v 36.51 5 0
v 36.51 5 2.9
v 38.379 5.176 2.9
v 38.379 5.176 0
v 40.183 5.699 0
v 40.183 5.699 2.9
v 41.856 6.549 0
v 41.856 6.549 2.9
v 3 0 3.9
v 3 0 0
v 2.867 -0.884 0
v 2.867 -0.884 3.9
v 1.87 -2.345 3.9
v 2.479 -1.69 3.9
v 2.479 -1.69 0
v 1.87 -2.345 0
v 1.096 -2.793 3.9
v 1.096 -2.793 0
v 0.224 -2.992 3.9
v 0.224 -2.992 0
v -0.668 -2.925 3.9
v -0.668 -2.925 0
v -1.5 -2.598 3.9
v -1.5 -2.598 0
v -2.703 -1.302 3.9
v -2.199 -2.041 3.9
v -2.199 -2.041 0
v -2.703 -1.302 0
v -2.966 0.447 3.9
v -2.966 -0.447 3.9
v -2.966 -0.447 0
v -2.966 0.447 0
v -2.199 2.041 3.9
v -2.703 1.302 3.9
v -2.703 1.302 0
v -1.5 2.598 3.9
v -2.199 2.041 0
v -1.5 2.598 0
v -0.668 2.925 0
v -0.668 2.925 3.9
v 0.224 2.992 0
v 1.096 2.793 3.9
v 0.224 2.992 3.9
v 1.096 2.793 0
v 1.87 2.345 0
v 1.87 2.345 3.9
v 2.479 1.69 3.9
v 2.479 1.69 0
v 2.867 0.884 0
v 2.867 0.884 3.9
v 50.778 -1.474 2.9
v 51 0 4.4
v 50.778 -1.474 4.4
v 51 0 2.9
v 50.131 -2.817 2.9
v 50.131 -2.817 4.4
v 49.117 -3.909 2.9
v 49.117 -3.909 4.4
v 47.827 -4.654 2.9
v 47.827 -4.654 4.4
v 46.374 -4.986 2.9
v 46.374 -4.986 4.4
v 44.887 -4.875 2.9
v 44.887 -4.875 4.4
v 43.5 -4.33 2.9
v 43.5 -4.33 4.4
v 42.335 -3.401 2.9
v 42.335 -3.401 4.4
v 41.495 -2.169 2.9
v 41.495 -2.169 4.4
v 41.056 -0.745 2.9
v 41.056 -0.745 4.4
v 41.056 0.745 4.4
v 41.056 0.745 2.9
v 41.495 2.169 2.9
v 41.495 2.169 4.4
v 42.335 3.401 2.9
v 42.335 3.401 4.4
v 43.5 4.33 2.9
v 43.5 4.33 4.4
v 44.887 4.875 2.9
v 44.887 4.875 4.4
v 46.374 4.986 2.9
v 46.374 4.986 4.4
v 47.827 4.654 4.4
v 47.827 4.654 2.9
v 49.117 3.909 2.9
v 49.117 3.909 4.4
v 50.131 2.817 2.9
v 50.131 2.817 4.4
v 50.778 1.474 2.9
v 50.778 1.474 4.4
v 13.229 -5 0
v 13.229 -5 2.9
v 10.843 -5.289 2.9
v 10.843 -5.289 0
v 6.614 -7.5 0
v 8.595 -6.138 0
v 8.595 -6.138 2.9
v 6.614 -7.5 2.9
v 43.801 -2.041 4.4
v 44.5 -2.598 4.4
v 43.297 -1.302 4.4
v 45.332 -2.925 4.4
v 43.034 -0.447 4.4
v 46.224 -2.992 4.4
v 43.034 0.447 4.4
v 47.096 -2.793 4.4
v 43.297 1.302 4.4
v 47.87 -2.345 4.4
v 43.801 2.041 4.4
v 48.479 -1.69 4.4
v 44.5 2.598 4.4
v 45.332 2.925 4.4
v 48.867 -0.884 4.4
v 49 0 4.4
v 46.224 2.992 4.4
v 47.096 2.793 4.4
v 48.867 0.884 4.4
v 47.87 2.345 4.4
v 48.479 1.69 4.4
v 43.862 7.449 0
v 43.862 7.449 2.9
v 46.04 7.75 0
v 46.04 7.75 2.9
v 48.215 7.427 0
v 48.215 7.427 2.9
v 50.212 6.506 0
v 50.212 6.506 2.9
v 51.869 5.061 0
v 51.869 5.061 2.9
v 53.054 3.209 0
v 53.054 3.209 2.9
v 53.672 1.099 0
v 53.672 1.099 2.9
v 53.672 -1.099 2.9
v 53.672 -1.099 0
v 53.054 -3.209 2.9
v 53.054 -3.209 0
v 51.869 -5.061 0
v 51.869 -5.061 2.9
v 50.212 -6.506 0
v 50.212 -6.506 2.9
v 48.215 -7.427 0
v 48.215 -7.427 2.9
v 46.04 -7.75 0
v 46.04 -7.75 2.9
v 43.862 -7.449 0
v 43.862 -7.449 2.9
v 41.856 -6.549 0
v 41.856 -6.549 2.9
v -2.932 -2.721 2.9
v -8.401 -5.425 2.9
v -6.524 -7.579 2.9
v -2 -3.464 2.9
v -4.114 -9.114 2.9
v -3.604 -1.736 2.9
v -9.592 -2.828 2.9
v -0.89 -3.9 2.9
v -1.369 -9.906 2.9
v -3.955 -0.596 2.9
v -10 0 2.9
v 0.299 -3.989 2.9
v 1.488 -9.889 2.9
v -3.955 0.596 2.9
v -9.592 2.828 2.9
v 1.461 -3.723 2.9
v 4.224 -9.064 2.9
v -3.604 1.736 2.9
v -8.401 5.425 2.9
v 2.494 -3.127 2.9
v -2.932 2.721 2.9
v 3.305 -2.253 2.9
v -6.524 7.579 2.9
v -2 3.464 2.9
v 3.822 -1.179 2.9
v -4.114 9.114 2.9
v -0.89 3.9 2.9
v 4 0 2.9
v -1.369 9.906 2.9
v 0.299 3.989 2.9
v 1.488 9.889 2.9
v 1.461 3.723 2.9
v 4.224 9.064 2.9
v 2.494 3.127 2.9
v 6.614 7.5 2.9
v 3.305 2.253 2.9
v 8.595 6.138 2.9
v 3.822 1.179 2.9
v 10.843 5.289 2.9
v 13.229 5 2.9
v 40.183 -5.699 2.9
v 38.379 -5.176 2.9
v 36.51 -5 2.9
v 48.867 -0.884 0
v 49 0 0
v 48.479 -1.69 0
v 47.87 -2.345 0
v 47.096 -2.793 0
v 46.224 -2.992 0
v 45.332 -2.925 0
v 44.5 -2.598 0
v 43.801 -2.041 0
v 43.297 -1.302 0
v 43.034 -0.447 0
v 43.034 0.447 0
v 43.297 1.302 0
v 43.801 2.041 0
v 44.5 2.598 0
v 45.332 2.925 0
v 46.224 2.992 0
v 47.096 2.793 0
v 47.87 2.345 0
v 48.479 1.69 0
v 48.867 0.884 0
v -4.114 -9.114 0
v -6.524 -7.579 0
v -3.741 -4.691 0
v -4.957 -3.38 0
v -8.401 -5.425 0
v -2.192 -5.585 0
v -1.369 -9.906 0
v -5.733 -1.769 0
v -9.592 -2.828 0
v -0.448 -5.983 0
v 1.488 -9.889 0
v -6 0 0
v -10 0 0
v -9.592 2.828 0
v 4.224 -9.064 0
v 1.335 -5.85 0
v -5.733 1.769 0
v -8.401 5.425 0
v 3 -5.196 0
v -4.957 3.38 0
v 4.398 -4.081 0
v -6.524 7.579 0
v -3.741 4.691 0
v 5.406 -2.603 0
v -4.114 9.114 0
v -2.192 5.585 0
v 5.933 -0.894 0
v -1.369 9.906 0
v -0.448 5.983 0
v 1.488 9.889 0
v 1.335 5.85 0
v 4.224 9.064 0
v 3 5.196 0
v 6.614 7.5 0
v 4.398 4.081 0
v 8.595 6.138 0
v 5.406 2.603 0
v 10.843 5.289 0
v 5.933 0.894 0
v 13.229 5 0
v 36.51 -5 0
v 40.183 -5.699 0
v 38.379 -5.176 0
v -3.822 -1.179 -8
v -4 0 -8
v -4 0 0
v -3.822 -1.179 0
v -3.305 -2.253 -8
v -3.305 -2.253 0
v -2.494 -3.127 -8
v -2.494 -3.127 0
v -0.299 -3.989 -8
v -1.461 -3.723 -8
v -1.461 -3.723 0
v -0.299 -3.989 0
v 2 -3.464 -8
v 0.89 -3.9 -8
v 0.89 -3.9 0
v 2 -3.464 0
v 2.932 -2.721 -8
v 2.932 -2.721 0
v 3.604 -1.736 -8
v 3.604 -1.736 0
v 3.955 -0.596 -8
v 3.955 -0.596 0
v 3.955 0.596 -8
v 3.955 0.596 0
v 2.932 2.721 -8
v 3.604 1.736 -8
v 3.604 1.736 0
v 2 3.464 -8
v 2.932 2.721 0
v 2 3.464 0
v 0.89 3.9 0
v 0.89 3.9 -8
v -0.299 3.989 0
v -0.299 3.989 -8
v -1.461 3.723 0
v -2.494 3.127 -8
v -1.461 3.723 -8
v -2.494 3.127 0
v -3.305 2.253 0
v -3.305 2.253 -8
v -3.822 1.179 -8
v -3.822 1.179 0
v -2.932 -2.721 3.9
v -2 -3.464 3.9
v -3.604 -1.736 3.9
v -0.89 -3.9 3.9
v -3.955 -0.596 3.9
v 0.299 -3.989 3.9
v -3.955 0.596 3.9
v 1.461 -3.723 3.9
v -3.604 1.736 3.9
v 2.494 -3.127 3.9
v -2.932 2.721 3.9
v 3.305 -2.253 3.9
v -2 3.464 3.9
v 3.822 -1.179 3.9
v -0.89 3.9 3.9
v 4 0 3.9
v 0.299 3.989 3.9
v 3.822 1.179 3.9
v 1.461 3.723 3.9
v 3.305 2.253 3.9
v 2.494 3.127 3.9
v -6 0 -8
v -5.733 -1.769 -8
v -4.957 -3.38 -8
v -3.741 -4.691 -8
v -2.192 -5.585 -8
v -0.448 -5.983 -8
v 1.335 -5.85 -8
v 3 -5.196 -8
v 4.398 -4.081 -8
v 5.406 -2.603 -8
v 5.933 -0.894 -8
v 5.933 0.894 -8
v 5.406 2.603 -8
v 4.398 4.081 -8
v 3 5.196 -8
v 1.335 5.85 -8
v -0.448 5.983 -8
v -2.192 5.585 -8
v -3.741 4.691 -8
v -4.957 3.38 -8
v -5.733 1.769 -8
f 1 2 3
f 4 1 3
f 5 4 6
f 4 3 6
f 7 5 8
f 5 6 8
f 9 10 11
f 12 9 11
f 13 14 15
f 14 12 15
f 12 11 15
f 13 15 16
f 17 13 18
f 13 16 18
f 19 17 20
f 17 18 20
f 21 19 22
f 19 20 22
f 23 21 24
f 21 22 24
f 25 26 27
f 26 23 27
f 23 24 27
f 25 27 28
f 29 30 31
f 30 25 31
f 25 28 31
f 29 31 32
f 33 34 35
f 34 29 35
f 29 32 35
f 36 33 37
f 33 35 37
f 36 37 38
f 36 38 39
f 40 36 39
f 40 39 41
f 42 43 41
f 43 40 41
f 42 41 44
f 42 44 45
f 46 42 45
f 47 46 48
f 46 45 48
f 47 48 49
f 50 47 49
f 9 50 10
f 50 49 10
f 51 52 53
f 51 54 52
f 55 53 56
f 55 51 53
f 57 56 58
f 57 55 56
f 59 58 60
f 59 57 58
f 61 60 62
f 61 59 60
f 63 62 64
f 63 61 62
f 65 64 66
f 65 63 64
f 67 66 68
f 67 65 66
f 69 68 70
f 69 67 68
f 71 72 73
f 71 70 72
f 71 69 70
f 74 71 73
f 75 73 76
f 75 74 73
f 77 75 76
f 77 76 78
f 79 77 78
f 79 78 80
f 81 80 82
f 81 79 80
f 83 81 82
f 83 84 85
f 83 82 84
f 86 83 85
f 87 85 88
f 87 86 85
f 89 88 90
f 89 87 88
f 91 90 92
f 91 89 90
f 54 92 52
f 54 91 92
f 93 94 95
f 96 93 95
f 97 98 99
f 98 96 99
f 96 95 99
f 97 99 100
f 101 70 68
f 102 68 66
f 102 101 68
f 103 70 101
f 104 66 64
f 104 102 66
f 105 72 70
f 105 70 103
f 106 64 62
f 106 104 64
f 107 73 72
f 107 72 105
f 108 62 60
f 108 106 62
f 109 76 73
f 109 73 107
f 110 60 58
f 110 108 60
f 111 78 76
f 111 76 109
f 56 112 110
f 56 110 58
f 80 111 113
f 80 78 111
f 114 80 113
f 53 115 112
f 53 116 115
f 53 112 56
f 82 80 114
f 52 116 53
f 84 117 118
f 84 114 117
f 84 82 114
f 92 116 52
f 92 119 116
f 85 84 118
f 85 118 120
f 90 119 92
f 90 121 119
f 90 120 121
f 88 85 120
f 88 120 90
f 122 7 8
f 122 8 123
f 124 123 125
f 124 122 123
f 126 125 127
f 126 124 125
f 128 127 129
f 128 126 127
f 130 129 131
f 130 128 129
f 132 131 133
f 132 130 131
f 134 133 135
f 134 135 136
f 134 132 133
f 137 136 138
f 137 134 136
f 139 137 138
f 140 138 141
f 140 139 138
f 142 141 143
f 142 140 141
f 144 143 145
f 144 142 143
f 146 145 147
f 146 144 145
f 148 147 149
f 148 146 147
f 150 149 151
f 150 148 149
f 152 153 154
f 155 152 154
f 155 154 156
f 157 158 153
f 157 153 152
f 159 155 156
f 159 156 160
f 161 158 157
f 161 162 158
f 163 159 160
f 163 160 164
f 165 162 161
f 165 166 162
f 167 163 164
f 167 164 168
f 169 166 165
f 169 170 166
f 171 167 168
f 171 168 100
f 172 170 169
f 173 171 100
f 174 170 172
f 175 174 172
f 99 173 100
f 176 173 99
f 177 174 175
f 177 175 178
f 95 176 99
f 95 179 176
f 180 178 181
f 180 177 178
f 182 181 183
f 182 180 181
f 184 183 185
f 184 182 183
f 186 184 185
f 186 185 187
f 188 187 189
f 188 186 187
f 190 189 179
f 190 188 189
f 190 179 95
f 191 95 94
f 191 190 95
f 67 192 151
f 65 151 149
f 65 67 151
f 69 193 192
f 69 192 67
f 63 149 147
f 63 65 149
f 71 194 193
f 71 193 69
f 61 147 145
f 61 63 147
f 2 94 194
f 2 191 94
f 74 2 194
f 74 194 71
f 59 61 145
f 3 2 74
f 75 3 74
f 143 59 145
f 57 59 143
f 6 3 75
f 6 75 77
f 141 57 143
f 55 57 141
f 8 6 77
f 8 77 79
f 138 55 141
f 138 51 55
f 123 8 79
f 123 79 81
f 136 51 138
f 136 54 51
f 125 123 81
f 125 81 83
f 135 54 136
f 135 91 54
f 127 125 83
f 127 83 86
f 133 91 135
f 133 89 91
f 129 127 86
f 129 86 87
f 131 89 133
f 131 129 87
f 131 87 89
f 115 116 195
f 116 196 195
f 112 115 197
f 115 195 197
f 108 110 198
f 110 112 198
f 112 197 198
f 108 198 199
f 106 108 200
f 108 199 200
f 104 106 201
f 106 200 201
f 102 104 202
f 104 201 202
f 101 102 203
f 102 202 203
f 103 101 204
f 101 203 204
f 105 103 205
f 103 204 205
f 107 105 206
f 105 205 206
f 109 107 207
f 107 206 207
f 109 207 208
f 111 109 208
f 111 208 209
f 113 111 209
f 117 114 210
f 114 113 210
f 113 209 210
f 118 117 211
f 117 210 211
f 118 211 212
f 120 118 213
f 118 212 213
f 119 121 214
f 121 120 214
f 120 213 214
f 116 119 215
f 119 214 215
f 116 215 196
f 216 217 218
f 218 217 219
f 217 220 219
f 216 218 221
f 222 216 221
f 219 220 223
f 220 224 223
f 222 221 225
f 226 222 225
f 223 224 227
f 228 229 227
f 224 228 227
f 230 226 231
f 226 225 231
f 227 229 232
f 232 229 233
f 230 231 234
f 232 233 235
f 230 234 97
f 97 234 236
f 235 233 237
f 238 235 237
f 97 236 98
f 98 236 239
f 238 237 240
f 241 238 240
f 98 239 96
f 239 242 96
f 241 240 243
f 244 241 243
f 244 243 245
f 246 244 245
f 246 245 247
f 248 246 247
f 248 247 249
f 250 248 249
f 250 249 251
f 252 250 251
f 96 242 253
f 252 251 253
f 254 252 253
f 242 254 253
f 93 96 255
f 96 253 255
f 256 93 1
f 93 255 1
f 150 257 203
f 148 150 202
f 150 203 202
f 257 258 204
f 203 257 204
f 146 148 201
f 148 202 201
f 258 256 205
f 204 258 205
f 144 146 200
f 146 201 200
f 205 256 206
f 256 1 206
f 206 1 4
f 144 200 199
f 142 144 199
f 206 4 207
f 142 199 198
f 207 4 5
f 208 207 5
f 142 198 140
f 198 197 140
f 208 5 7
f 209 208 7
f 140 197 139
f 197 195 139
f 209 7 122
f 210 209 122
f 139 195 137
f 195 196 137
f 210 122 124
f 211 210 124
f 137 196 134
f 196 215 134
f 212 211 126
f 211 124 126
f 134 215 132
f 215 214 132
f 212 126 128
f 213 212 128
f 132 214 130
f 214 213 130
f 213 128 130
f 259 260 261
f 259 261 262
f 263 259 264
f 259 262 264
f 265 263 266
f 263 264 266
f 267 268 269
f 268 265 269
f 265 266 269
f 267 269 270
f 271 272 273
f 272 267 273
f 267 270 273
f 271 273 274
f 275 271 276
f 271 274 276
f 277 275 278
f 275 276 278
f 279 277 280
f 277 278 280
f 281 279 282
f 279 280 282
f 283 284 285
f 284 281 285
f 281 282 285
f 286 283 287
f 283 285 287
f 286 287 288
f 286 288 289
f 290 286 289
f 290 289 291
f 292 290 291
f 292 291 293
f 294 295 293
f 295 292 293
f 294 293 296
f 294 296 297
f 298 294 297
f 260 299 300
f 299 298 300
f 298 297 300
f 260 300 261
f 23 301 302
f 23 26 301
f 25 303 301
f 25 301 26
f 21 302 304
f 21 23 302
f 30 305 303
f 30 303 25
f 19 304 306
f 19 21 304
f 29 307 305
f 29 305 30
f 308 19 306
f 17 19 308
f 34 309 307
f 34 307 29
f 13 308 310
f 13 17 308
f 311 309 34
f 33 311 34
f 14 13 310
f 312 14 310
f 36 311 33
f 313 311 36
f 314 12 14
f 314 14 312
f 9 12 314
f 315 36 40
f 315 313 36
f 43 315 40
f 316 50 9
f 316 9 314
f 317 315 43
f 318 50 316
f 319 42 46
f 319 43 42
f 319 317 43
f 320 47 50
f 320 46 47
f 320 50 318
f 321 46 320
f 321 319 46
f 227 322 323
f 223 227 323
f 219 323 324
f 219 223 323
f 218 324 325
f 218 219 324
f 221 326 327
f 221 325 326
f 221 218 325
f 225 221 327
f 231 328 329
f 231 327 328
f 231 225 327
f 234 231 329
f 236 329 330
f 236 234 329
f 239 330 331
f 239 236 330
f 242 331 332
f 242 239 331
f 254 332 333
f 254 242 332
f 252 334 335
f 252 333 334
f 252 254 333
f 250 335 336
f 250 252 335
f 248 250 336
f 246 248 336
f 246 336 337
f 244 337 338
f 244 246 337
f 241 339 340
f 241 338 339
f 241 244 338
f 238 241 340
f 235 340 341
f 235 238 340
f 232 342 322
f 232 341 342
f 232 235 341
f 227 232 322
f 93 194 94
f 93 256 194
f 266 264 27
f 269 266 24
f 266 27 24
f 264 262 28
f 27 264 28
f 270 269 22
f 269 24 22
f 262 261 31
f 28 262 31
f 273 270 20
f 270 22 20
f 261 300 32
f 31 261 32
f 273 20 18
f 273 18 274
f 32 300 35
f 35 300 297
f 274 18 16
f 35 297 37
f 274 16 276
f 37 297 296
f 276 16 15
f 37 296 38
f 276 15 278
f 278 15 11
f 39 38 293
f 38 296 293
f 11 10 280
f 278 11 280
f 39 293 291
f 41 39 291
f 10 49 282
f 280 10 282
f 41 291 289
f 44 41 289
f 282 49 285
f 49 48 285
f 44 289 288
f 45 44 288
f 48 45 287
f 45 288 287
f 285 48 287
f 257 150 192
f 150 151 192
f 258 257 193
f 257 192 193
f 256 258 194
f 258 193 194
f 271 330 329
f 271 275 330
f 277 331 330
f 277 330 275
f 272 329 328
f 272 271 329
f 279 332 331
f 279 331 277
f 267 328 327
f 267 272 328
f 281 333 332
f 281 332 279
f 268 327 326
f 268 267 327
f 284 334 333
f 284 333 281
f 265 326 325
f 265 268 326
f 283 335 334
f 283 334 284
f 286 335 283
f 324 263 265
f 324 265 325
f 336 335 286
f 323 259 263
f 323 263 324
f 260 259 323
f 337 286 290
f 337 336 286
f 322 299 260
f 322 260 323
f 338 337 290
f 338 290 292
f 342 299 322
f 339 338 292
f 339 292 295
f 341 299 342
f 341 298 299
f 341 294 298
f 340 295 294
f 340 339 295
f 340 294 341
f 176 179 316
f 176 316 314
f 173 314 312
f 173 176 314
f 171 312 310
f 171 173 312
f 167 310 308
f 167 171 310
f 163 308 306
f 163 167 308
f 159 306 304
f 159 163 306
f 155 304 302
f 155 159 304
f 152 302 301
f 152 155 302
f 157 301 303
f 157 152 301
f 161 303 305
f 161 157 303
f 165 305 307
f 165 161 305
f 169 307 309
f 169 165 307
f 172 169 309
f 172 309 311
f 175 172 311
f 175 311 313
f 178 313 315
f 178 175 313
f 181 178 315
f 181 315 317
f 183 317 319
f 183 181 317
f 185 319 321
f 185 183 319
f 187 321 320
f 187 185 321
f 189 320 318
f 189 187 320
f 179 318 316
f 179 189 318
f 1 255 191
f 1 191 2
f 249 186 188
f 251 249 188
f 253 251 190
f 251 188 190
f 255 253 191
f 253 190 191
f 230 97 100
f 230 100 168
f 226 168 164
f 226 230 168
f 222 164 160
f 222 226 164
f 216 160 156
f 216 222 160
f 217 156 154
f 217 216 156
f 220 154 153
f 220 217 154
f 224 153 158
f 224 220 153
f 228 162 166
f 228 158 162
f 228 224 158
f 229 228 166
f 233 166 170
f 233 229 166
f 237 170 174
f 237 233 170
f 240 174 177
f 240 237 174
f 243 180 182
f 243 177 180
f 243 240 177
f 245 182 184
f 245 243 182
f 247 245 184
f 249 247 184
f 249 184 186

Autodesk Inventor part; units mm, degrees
ref_plane "YZ Plane" through (0, 0, 0) normal (1, 0, 0) x (0, 1, 0)
ref_plane "XZ Plane" through (0, 0, 0) normal (0, 1, 0) x (-1, 0, 0)
ref_plane "XY Plane" through (0, 0, 0) normal (0, 0, 1) x (1, 0, 0)
sketch "Base" plane through (0, 0, 0) normal (0, 0, 1) x (1, 0, 0)
  circle A0 centre (0, 0) radius 10
  line L0 (0, 0) -> (46, 0) construction
  circle A1 centre (46, 0) radius 7.75
  line L1 (8.6603, 5) -> (40.0786, 5)
  line L2 (40.0786, 5) -> (40.0786, -5)
  line L3 (40.0786, -5) -> (8.6603, -5)
  line L4 (8.6603, -5) -> (8.6603, 5)
  circle A2 centre (46, 0) radius 3
  circle A3 centre (0, 0) radius 3
  point P0 (8.6603, 0)
  point P1 (8.6603, -5)
  dimension "d0" = 20
  dimension "d2" = 15.5
  dimension "d1" = 46
  dimension "d3" = 10
  dimension "d4" = 6
  dimension "d5" = 6
extrude "Plate1" add sketch "Base" along normal blind 2.9
sketch "Shoulder" plane through (0, 0, 0) normal (0, 0, -1) x (-1, 0, 0)
  circle A0 centre (0, 0) radius 3 projected
  circle A1 centre (0, 0) radius 3 projected
  circle A2 centre (0, 0) radius 6
  circle A3 centre (0, 0) radius 4
  dimension "d7" = 12
  dimension "d8" = 2
extrude "ShoulderFeature" add sketch "Shoulder" along normal blind 8 contours A2
sketch "Mount" plane through (0, 0, 2.9) normal (0, 0, 1) x (1, 0, 0)
  circle A0 centre (46, 0) radius 3 projected
  circle A1 centre (46, 0) radius 5
  point P0 (0, 0)
  dimension "d11" = 2
extrude "MountFeature" add sketch "Mount" along normal blind 1.5
fillet "BaseFilletsFeature" radius 10 2 edges at (8.6603, 5, 1.45) (8.6603, -5, 1.45)
fillet "EndFilletsFeature" radius 10 2 edges at (40.0786, 5, 1.45) (40.0786, -5, 1.45)
sketch "Sketch6" plane through (0, 0, 2.9) normal (0, 0, 1) x (1, 0, 0)
  circle A0 centre (0, 0) radius 3 projected
  circle A1 centre (0, 0) radius 4
  dimension "d17" = 1
extrude "Extrusion3" add sketch "Sketch6" along normal blind 1
equation "\"d6\" = Thickness"
equation "\"BendRadius\" = Thickness"
equation "\"BendReliefWidth\" = Thickness"
equation "\"BendReliefDepth\" = 0.5 * Thickness"
equation "\"CornerReliefSize\" = 4 * Thickness"
equation "\"MinimumRemnant\" = 2 * Thickness"
equation "\"TransitionRadius\" = BendRadius"
equation "\"JacobiRadiusSize\" = BendRadius"
equation "\"GapSize\" = Thickness"
equation "\"Thickness\" = 2.9"
properties part number "LegChainTensionerArm"
